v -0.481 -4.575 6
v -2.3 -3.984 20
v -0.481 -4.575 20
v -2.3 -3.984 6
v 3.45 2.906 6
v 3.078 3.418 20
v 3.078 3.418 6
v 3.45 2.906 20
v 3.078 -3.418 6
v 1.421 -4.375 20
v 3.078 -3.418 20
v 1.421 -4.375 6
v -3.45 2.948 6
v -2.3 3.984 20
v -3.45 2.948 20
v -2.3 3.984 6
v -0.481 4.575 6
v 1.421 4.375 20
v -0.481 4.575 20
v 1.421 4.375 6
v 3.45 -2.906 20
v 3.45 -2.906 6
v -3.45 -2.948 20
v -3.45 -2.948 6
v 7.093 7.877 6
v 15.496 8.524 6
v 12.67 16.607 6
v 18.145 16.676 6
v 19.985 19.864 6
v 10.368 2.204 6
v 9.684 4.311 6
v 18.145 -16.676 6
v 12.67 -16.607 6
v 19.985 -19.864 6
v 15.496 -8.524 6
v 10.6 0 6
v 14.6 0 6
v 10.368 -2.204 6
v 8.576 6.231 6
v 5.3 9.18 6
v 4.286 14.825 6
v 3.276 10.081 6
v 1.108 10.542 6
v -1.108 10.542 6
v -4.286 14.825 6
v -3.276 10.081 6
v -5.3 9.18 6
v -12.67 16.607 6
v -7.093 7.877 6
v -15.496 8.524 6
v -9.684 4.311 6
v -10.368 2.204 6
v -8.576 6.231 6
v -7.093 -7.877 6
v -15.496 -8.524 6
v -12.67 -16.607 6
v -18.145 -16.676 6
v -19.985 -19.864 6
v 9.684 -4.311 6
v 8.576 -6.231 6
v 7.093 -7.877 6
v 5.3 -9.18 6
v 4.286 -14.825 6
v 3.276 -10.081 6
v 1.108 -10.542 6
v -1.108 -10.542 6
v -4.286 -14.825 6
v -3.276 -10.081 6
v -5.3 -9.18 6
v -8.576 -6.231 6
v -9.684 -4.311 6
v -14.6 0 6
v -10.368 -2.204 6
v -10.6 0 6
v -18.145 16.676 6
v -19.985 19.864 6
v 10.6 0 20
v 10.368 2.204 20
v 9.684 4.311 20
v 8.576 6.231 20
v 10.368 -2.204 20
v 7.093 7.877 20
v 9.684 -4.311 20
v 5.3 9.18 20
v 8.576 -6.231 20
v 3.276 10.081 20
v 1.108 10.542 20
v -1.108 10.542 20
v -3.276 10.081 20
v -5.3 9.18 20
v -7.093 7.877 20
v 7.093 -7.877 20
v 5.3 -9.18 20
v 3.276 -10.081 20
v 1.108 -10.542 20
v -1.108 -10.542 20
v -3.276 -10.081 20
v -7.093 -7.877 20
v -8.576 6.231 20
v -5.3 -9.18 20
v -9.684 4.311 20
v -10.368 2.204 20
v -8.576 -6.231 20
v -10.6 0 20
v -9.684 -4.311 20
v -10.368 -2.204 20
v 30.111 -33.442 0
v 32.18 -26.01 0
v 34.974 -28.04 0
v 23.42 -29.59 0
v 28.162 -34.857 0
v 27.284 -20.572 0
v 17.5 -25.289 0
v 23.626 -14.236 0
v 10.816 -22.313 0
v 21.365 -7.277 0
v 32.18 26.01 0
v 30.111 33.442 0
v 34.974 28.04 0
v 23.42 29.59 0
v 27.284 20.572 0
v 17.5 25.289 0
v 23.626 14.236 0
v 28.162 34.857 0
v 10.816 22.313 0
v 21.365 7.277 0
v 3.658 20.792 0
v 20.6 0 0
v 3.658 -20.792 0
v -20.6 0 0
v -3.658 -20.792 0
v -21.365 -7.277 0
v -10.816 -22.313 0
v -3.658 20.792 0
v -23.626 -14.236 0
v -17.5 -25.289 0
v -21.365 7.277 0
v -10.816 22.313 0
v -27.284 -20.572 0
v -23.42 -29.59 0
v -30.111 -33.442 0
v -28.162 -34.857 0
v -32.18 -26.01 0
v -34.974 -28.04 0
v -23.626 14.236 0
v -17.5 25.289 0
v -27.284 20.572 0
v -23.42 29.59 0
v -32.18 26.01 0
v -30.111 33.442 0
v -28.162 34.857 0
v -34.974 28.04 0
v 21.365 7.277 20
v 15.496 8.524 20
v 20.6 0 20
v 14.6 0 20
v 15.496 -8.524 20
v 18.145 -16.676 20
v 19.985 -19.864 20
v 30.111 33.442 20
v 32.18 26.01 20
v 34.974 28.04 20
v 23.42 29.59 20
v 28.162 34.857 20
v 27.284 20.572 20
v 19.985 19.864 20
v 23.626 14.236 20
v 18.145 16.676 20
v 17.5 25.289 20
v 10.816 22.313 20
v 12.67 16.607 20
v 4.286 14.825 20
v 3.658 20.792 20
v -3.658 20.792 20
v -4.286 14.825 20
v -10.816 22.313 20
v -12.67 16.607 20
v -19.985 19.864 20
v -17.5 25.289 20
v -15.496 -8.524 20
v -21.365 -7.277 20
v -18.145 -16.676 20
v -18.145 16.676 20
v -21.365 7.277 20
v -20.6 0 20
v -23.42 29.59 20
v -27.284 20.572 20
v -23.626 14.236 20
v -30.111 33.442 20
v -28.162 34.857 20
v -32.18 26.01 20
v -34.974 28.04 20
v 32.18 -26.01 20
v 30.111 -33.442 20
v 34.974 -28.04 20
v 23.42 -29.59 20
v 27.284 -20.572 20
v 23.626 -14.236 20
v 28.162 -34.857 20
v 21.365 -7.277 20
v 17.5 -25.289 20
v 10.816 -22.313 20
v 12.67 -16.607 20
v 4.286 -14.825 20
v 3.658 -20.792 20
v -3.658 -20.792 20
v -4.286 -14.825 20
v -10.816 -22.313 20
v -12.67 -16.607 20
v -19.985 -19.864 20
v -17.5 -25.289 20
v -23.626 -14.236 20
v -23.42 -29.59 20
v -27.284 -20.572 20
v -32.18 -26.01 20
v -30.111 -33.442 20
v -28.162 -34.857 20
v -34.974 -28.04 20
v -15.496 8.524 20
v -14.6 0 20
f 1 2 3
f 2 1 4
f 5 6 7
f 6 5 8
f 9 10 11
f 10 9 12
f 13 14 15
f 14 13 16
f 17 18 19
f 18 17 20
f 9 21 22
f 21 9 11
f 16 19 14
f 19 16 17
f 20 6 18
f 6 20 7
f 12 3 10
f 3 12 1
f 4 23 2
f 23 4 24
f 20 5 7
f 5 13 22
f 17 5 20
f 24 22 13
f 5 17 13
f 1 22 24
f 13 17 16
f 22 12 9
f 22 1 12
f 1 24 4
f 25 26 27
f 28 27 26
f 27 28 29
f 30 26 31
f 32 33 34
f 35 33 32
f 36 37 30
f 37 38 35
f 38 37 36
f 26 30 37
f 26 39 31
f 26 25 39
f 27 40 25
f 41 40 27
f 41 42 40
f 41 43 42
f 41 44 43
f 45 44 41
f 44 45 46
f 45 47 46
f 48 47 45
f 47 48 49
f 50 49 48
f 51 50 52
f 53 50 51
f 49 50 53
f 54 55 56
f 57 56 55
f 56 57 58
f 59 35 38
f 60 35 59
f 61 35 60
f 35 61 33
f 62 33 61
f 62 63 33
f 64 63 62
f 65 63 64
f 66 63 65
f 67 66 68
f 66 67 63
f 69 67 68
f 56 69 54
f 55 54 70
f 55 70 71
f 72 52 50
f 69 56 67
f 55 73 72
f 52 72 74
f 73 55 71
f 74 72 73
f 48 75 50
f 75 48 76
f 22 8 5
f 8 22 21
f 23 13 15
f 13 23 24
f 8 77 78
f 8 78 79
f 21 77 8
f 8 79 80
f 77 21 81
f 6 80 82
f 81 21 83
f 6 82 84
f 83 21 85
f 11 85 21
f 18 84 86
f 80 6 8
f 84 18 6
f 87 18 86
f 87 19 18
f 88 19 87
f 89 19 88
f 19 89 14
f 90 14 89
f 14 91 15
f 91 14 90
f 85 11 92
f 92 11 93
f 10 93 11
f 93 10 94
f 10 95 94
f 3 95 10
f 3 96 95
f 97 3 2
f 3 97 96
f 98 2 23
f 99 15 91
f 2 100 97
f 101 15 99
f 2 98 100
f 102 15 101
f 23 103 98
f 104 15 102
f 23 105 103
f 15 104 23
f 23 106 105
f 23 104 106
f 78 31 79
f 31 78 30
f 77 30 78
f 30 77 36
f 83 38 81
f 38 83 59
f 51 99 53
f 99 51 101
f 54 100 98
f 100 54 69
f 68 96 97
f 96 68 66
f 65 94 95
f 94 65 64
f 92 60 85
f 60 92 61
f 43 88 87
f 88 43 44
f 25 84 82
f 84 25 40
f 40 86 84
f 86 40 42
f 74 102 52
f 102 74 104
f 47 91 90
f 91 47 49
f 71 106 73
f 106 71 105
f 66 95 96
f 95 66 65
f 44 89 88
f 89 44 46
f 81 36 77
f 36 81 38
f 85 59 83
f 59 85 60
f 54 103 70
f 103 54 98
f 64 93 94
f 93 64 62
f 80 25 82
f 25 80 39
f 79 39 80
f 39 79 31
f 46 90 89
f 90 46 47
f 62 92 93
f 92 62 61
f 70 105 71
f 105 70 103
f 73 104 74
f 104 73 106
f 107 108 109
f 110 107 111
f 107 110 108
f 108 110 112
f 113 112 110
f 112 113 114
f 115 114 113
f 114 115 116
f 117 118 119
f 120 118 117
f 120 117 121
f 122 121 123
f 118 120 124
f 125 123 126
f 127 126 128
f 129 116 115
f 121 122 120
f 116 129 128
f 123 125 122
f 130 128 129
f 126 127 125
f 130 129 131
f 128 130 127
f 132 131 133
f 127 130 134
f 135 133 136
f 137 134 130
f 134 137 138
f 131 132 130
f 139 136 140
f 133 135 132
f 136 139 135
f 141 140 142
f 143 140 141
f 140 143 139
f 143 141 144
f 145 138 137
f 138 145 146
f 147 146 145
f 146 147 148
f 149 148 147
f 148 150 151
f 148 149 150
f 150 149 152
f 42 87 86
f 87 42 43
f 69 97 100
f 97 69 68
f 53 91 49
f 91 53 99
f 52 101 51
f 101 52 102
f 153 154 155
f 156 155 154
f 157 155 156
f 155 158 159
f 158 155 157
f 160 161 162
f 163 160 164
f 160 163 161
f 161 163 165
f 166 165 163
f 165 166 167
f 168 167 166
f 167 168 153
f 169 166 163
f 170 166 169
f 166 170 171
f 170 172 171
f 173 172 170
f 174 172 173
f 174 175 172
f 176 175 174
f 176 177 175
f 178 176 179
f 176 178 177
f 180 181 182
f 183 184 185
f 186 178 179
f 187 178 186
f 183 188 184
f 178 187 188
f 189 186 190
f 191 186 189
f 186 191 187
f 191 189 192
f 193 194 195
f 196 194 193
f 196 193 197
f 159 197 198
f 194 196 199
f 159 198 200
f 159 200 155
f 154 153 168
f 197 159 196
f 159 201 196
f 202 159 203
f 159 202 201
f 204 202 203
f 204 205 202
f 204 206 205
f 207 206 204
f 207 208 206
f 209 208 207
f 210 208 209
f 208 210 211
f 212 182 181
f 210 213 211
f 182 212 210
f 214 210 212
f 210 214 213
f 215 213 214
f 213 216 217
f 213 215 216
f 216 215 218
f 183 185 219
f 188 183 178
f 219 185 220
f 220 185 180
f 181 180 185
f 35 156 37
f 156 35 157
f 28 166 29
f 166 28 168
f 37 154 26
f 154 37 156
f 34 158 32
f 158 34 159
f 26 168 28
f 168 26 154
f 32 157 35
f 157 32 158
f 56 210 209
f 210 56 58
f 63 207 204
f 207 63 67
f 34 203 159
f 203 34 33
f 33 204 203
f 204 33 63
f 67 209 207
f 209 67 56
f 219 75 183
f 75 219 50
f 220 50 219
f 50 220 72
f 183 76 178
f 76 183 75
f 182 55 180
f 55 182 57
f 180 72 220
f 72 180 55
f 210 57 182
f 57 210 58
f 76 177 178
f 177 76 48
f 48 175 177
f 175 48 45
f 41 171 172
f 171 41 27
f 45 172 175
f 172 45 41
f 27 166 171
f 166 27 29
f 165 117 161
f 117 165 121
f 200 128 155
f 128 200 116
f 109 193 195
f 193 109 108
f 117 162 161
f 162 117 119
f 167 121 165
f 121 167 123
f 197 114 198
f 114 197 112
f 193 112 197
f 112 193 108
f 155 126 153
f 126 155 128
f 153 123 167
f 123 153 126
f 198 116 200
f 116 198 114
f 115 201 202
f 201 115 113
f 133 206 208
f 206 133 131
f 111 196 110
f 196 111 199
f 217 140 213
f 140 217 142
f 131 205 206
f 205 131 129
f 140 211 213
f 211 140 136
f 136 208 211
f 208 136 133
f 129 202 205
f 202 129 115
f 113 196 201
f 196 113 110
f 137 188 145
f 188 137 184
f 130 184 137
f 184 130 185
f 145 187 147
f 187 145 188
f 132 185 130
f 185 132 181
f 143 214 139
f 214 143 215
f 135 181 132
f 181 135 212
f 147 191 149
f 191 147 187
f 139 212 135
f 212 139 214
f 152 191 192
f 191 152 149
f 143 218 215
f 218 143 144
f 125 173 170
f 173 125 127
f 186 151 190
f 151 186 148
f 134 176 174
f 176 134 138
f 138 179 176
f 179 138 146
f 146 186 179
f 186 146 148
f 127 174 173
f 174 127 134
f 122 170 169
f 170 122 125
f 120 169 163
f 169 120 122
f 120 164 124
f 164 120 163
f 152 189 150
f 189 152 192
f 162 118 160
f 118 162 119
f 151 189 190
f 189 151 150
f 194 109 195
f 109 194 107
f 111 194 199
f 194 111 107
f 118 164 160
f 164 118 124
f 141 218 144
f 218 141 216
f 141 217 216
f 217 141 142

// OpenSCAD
thickness=20;
outer_r=45;
knob_r=35;
bolt_r=4.6;
wall_thickness=6;
square_ratio=1.5;


union(){
	difference(){
		cylinder(r=bolt_r+wall_thickness,h=thickness);
		intersection(){
			translate([0,0,wall_thickness])cylinder(r=bolt_r,h=thickness);
			translate([-square_ratio*.5*bolt_r,-bolt_r*2,wall_thickness])cube([square_ratio*bolt_r,bolt_r*4,thickness]);
		}
	}
	intersection(){
		difference(){
			union(){
				difference(){
					cylinder(r=outer_r,h=thickness);
					translate([0,0,wall_thickness])cylinder(r=outer_r-wall_thickness,h=thickness);
					}
				translate([(outer_r+bolt_r+wall_thickness)*sin(90),(outer_r+bolt_r+wall_thickness)*cos(90),0])cylinder(r=knob_r+wall_thickness,h=thickness);
				translate([(outer_r+bolt_r+wall_thickness)*sin(180),(outer_r+bolt_r+wall_thickness)*cos(180),0])cylinder(r=knob_r+wall_thickness,h=thickness);
				translate([(outer_r+bolt_r+wall_thickness)*sin(270),(outer_r+bolt_r+wall_thickness)*cos(270),0])cylinder(r=knob_r+wall_thickness,h=thickness);
				translate([(outer_r+bolt_r+wall_thickness)*sin(360),(outer_r+bolt_r+wall_thickness)*cos(360),0])cylinder(r=knob_r+wall_thickness,h=thickness);
			}

			translate([(outer_r+bolt_r+wall_thickness)*sin(90),(outer_r+bolt_r+wall_thickness)*cos(90),-wall_thickness])cylinder(r=knob_r,h=thickness+wall_thickness*2);
			translate([(outer_r+bolt_r+wall_thickness)*sin(180),(outer_r+bolt_r+wall_thickness)*cos(180),-wall_thickness])cylinder(r=knob_r,h=thickness+wall_thickness*2);
			translate([(outer_r+bolt_r+wall_thickness)*sin(270),(outer_r+bolt_r+wall_thickness)*cos(270),-wall_thickness])cylinder(r=knob_r,h=thickness+wall_thickness*2);
			translate([(outer_r+bolt_r+wall_thickness)*sin(360),(outer_r+bolt_r+wall_thickness)*cos(360),-wall_thickness])cylinder(r=knob_r,h=thickness+wall_thickness*2);
		}
	cylinder(r=outer_r,h=thickness);
	}
}
